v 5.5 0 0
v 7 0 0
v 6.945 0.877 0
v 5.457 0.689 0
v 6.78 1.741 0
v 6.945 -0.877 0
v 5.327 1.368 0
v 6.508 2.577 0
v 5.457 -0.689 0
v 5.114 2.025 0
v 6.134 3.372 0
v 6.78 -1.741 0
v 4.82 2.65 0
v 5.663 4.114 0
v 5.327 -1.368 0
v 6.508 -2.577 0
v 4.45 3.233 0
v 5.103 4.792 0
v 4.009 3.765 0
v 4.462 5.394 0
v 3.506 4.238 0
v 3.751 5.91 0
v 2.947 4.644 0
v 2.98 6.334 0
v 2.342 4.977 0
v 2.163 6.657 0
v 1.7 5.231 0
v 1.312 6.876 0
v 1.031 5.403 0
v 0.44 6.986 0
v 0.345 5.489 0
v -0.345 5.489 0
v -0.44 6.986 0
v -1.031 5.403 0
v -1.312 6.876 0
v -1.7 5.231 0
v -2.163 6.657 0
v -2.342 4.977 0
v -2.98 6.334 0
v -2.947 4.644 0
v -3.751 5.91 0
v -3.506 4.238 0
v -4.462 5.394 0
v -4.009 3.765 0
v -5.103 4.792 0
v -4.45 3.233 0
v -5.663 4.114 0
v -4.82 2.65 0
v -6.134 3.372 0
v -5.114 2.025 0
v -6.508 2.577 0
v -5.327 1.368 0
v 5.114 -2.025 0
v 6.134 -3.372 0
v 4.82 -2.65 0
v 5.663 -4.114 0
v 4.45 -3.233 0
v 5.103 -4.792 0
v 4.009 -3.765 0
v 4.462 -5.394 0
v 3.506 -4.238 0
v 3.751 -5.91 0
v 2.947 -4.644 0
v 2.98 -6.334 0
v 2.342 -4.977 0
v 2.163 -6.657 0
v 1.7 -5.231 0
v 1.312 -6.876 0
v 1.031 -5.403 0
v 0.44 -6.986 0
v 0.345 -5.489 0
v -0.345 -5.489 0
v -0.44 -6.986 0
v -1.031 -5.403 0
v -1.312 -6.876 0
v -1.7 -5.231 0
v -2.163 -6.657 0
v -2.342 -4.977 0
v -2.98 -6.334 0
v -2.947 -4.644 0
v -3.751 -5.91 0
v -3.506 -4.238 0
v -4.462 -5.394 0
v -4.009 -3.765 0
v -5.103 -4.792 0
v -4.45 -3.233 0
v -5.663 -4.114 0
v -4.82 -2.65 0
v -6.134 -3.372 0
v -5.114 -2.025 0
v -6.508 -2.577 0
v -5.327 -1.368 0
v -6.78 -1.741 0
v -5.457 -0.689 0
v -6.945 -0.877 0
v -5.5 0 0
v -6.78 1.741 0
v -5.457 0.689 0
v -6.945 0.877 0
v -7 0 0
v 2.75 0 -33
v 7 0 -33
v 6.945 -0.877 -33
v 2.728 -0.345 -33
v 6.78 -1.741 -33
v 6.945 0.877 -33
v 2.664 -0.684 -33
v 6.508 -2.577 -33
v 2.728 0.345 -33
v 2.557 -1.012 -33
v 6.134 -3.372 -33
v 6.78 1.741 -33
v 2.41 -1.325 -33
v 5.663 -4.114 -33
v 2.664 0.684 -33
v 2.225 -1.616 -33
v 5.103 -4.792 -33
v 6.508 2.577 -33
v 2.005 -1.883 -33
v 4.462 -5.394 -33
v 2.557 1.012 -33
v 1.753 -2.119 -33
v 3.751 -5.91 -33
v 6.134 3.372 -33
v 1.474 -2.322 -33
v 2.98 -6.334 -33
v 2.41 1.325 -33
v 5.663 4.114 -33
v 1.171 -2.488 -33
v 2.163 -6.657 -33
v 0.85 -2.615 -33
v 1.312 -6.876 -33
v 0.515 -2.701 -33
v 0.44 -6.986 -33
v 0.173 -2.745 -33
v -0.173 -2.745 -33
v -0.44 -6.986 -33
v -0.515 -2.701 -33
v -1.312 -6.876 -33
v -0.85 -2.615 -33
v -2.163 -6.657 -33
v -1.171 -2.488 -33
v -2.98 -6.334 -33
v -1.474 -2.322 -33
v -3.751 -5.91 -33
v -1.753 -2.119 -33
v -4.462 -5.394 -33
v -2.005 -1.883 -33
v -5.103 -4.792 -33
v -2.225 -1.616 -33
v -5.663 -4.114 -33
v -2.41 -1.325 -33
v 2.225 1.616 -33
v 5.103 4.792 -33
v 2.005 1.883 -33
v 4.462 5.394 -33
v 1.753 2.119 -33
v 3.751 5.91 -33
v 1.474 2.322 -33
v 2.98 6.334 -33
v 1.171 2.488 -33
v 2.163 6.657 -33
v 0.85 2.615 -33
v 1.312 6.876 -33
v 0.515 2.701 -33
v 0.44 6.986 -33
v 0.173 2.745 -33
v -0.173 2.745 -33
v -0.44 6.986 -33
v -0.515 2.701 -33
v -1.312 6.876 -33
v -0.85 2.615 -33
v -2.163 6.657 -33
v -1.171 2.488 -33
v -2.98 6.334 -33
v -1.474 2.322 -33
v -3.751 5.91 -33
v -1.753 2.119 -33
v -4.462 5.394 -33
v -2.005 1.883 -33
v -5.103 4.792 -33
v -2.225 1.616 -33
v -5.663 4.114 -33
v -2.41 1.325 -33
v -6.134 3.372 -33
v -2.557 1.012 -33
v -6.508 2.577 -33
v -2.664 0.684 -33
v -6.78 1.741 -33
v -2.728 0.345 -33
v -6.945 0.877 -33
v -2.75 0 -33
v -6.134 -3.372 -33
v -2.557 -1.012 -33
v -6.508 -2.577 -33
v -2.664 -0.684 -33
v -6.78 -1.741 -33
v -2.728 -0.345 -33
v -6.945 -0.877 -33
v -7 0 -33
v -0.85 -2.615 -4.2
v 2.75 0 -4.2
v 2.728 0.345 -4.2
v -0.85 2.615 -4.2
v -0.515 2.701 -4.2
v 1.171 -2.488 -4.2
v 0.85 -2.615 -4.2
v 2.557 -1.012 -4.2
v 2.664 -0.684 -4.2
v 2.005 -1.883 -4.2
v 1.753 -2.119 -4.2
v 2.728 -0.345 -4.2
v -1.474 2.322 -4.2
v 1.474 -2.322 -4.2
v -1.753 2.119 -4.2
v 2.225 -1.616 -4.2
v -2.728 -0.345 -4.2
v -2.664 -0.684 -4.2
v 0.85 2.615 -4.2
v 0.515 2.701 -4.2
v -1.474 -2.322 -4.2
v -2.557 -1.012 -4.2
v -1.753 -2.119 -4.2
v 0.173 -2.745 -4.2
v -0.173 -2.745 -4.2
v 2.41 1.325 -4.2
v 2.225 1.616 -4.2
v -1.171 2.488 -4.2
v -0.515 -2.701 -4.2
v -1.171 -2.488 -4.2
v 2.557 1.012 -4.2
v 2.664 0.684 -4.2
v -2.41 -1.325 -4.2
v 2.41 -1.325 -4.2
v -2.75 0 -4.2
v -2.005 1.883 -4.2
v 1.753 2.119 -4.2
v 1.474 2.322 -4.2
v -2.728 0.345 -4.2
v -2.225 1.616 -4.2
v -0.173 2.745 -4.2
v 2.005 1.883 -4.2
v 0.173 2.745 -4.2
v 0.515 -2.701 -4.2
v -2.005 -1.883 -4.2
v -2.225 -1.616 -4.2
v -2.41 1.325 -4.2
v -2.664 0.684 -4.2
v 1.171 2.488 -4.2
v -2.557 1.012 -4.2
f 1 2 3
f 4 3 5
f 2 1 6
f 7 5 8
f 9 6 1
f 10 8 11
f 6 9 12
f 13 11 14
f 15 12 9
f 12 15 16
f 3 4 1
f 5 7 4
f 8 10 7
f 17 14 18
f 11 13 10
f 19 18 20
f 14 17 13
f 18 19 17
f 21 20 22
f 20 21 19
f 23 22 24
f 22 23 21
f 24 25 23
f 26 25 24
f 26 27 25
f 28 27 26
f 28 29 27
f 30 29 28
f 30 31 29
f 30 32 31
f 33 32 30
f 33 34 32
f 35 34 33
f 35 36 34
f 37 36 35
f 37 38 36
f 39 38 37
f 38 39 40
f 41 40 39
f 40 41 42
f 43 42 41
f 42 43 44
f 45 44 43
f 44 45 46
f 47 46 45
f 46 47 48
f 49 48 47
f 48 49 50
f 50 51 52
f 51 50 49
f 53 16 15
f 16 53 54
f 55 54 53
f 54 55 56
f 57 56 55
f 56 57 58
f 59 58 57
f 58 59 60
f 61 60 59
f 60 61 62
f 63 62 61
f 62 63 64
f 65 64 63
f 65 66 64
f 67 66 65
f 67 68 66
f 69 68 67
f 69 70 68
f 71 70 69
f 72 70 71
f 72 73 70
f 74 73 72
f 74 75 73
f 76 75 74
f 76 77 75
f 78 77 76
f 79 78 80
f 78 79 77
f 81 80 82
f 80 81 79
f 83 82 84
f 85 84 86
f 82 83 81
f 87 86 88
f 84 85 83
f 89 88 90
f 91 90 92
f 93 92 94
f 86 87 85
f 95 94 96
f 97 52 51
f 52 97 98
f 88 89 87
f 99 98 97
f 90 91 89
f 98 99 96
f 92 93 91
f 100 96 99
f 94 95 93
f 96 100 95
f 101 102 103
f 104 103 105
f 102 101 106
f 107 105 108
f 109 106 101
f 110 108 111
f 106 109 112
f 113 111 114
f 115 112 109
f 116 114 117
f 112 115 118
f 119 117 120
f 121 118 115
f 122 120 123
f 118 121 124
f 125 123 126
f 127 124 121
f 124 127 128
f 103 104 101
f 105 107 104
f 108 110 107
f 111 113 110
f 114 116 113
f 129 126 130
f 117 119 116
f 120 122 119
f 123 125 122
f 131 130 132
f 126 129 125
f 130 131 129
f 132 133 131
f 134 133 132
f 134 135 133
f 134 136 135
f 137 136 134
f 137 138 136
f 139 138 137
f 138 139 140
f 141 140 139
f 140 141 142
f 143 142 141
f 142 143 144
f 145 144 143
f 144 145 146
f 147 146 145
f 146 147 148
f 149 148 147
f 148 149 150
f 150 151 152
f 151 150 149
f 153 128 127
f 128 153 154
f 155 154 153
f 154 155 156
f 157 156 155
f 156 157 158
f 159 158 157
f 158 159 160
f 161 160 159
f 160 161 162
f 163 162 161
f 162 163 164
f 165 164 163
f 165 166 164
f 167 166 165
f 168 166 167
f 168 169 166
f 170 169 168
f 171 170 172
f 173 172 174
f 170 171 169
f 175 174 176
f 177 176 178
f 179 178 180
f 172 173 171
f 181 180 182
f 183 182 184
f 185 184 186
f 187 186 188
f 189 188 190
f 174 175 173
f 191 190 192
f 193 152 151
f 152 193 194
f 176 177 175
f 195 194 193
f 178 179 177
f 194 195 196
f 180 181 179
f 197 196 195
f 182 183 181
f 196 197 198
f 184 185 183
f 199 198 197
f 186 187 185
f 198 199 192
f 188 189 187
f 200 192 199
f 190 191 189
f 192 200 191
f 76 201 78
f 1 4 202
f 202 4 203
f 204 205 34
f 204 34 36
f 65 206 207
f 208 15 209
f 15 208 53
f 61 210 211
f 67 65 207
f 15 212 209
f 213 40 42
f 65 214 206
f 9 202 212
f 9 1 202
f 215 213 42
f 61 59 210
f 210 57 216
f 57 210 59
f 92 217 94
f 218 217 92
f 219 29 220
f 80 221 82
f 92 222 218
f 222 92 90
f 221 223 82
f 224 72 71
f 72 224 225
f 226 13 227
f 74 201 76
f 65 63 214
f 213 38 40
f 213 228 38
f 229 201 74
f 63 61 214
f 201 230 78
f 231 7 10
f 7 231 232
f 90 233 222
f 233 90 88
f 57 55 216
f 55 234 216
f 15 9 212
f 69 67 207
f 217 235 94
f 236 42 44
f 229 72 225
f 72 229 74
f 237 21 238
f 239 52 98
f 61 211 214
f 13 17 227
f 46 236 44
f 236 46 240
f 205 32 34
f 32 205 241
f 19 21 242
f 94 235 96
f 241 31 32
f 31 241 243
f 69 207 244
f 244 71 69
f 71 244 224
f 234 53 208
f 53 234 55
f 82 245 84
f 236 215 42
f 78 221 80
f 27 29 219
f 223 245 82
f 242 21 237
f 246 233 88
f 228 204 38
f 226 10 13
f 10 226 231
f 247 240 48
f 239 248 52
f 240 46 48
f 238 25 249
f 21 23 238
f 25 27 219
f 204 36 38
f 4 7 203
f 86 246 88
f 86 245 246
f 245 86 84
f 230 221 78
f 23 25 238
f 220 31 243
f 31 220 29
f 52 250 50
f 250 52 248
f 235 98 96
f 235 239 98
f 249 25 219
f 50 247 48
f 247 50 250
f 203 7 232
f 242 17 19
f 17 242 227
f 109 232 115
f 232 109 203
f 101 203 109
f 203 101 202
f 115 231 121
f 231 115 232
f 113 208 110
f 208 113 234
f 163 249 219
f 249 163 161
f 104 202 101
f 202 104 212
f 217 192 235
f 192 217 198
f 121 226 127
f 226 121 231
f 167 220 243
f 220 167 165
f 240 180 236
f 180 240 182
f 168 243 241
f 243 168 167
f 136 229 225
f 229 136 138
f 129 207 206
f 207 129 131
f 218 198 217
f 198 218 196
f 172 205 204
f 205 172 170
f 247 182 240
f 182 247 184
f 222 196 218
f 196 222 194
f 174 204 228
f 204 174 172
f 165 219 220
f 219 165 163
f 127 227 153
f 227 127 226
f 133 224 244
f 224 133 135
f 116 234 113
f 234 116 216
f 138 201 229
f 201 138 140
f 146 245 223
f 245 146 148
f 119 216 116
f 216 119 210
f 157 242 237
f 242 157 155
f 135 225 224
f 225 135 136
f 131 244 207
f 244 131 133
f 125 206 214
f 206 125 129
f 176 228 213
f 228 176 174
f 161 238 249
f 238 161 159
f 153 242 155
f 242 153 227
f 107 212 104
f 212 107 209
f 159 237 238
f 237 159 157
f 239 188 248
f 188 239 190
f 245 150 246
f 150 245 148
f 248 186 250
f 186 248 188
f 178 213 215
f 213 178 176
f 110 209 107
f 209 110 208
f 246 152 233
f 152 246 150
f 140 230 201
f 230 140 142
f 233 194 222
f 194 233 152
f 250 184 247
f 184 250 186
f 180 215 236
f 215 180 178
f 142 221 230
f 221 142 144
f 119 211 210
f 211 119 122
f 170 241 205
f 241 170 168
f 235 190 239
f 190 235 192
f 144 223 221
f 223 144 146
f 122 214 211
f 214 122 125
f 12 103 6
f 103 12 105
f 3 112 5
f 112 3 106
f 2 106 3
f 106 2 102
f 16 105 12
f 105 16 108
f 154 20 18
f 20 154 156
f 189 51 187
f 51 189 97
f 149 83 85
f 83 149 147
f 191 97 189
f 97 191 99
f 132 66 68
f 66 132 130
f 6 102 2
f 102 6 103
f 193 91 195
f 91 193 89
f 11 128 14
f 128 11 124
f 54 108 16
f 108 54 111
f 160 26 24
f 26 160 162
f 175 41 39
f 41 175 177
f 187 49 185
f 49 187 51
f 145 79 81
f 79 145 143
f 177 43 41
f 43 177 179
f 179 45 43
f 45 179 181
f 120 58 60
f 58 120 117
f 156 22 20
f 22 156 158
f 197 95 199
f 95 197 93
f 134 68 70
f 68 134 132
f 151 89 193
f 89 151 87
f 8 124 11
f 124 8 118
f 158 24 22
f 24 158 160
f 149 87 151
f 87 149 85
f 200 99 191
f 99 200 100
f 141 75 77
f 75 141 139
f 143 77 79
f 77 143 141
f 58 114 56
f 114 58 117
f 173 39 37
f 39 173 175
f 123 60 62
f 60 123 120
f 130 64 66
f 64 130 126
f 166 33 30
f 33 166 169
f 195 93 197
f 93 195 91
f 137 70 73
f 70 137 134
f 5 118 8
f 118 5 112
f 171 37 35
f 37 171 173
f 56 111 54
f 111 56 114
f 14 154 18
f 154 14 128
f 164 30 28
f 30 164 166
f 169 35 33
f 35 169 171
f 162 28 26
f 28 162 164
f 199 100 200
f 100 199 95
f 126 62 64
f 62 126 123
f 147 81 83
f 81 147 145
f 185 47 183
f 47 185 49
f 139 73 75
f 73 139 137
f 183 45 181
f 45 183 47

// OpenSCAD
$fn = 50;


difference() {
	union() {
		translate(v = [0, 0, -33.0000000000]) {
			cylinder(h = 33, r = 7.0000000000);
		}
		cylinder(h = 0, r = 16.0000000000);
	}
	union() {
		translate(v = [0, 0, 0]) {
			rotate(a = [0, 0, 0]) {
				difference() {
					union() {
						#translate(v = [0, 0, -33.0000000000]) {
							cylinder(h = 33, r = 2.2500000000);
						}
						#translate(v = [0, 0, -4.2000000000]) {
							cylinder(h = 4.2000000000, r1 = 2.7500000000, r2 = 5.5000000000);
						}
						#translate(v = [0, 0, -33.0000000000]) {
							cylinder(h = 33, r = 2.7500000000);
						}
						#translate(v = [0, 0, -33.0000000000]) {
							cylinder(h = 33, r = 2.2500000000);
						}
					}
					union();
				}
			}
		}
	}
}
